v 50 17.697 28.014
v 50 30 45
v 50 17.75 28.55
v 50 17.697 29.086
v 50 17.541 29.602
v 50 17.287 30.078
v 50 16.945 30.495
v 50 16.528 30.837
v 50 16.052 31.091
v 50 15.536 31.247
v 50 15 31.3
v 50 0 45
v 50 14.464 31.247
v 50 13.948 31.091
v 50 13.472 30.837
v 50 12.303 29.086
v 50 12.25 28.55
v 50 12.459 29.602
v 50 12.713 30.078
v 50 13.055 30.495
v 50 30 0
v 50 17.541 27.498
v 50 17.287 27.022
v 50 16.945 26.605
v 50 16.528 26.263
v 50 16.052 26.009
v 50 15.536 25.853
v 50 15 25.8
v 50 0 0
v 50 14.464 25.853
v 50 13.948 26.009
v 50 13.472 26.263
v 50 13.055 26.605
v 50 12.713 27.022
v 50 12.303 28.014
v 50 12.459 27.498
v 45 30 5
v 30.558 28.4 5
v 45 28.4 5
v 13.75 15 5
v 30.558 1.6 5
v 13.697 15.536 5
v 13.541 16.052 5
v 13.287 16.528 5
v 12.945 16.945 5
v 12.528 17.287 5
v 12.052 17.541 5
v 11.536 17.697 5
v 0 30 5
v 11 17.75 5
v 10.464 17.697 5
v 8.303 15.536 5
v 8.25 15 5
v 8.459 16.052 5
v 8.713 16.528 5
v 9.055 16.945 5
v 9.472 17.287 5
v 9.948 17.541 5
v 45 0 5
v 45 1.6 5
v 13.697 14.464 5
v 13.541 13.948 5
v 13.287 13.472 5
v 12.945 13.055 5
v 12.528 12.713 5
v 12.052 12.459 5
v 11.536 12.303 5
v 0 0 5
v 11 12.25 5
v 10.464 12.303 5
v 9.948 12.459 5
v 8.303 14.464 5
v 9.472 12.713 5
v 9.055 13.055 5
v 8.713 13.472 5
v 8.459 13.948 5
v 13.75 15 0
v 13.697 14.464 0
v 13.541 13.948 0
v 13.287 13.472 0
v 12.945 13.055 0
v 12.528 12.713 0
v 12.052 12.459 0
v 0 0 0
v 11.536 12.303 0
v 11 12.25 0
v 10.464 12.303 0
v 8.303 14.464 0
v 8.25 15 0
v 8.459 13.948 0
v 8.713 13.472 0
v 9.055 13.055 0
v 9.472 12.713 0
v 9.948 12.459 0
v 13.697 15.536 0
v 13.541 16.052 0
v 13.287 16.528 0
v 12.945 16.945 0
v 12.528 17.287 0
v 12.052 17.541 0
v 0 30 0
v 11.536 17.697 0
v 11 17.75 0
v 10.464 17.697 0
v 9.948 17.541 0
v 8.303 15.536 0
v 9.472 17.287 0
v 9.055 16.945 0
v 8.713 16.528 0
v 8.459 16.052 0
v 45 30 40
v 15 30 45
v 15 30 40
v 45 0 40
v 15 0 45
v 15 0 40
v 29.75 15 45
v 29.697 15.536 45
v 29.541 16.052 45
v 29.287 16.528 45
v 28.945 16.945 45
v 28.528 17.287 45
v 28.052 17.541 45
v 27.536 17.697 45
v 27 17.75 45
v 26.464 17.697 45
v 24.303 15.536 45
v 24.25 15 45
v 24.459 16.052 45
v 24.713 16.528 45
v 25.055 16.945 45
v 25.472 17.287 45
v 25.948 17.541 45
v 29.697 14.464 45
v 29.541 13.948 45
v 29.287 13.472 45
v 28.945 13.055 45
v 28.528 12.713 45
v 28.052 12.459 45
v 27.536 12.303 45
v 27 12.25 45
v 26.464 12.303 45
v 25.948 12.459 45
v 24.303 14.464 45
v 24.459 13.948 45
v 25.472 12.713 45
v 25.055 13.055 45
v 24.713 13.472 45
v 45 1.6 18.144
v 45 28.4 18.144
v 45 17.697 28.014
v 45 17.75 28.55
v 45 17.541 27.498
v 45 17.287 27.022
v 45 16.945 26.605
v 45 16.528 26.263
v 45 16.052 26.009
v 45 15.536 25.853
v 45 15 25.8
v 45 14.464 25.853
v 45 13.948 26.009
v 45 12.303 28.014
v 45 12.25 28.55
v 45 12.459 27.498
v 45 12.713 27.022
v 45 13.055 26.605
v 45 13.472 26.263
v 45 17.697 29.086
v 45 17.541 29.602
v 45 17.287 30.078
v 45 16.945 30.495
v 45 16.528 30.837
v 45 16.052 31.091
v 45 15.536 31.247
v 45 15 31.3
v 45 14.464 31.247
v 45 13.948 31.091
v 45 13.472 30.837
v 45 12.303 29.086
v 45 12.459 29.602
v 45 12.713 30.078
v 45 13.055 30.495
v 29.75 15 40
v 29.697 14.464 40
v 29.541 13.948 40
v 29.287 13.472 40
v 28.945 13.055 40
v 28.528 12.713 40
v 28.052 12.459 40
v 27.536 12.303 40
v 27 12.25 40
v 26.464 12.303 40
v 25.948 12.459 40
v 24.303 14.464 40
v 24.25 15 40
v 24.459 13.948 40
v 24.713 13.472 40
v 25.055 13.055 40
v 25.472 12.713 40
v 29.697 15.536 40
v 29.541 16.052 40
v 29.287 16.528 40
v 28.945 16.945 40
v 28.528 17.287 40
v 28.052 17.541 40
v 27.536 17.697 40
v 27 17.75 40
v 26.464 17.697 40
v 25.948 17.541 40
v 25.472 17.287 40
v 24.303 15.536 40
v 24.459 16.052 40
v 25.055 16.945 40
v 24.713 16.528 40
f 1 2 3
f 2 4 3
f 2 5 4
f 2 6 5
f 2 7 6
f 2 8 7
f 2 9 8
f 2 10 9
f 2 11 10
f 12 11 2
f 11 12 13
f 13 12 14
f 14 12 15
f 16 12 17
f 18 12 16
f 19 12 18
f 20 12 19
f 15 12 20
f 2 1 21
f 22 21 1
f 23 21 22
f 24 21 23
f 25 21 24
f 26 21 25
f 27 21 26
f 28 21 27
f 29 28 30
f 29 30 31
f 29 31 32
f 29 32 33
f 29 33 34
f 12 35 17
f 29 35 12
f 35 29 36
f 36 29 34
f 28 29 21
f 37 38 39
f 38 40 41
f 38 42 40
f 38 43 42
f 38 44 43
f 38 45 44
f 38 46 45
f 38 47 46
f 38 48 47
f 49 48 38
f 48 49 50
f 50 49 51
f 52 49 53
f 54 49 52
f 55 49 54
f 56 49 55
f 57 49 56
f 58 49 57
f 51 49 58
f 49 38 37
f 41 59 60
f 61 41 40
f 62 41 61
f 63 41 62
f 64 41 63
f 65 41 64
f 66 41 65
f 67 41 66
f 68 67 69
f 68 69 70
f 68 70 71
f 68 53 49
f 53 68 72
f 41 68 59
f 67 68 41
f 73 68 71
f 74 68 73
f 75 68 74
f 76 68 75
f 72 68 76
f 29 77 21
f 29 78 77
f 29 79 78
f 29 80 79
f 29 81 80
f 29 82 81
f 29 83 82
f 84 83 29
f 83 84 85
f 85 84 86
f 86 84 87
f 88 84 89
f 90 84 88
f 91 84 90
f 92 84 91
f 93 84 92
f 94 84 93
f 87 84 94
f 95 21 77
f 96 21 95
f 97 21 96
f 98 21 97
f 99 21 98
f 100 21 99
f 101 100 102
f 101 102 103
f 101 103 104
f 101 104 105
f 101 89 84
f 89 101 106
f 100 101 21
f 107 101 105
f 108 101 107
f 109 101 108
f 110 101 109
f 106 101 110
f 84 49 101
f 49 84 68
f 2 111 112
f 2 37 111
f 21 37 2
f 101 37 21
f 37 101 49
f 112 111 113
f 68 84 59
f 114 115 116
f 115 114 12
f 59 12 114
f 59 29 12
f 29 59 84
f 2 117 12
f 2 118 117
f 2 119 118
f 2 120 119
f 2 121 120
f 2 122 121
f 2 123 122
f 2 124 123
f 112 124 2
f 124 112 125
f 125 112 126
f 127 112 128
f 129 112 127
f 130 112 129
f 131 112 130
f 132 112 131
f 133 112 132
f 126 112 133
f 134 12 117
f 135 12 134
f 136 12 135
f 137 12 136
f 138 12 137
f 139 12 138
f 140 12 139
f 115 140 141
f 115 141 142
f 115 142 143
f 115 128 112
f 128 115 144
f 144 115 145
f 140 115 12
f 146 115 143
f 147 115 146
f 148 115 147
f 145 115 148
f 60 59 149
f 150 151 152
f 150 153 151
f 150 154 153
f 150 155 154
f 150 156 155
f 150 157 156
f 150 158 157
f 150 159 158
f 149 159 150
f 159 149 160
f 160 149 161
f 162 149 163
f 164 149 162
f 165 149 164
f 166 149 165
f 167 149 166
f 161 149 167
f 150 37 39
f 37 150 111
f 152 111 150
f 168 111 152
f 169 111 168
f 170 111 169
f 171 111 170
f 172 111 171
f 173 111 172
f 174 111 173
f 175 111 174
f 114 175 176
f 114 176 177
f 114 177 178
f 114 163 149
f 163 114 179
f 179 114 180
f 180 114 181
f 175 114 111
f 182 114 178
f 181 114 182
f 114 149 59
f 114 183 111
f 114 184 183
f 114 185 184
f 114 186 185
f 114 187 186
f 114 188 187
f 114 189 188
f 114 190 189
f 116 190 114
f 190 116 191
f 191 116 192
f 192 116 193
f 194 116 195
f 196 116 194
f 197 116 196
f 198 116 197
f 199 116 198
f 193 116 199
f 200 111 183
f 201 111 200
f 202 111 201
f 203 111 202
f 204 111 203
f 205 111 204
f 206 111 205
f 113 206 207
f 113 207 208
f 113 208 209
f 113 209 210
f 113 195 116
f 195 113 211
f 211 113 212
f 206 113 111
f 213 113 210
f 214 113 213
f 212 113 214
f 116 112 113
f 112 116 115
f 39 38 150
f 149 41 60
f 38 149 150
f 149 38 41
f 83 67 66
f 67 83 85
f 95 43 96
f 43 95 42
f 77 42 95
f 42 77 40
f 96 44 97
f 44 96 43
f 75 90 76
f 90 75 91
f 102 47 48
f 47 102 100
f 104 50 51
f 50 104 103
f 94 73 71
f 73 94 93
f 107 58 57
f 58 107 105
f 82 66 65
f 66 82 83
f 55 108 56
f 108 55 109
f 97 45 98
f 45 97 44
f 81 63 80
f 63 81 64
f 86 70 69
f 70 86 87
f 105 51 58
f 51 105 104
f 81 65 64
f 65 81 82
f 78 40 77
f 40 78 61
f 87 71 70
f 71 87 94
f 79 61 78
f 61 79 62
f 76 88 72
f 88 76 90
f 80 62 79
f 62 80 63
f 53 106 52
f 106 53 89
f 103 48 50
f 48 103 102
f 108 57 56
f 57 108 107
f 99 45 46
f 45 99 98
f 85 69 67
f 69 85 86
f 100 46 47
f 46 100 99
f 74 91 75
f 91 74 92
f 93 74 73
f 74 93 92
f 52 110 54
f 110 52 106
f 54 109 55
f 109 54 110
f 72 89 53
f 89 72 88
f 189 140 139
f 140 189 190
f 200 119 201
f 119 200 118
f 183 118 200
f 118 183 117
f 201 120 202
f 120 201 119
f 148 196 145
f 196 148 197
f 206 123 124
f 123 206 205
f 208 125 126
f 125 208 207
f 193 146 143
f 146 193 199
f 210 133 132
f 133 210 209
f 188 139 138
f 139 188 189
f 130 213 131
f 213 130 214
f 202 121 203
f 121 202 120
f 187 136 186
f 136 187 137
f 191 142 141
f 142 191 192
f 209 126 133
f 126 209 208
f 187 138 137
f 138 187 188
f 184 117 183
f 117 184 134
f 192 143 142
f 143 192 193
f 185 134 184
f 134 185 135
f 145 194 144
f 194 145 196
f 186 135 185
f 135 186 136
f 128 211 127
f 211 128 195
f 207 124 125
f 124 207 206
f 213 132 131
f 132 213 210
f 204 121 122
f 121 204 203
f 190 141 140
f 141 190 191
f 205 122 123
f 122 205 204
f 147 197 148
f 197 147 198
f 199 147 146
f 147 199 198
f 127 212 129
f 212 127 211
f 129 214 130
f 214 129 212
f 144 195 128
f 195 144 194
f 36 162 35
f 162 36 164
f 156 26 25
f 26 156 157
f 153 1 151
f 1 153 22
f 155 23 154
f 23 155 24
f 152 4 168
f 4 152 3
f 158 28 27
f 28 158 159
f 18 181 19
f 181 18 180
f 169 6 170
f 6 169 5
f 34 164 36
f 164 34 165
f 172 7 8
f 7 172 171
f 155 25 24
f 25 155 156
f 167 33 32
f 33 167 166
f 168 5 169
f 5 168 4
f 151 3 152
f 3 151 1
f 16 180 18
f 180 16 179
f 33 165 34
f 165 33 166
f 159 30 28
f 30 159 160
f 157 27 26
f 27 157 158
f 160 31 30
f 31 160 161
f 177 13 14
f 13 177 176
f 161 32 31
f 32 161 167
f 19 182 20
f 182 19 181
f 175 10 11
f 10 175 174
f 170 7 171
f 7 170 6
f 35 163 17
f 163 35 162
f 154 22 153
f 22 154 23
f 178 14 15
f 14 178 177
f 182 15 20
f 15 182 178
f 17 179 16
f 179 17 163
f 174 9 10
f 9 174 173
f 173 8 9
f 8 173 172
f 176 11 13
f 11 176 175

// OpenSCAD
$fn = 32;

// ----------------------------------------------------------------------
// Z-bracket: 50 x 30 x 45 mm
// ----------------------------------------------------------------------

// --- parameters (mm) ---
foot_len = 50;            // lower foot length, X
top_len = 30;             // upper foot length, X
depth = 30;               // bracket width, Y
step_h = 45;              // overall rise, Z
plate_t = 5;              // plate thickness
hole_d = 5.5;             // clearance for M5
rib_len = 16.2;           // gusset leg
rib_sink = 1.6;           // gusset overlap into the plates

module hole_z(px, py, z0) {
  translate([px, py, z0 - 2.5]) cylinder(h = plate_t + 5, d = hole_d);
}
module hole_x(py, pz) {
  translate([-2.5, py, pz]) rotate([0, 90, 0]) cylinder(h = plate_t + 5, d = hole_d);
}
module gusset(x0) {
  translate([x0, depth - rib_sink, 0])
    rotate([90, 0, 0])
      linear_extrude(height = depth - 2 * rib_sink)
        polygon(points = [[rib_sink, plate_t - rib_sink],
                          [rib_sink, plate_t - rib_sink + rib_len],
                          [-rib_len, plate_t - rib_sink]]);
}

difference() {
  union() {
    cube([foot_len, depth, plate_t]);
    /* web, overlapping the lower foot */
    translate([foot_len - plate_t, 0, 0]) cube([plate_t, depth, step_h]);
    /* upper foot, sunk into the web */
    translate([foot_len - plate_t - top_len, 0, step_h - plate_t]) cube([top_len + plate_t, depth, plate_t]);
    gusset(foot_len - plate_t);
  }
  hole_z(11, 15, 0);
  translate([foot_len - plate_t - 18, 0, 0]) hole_z(0, 15, step_h - plate_t);
  translate([foot_len - plate_t, 0, 0]) hole_x(15, 28.55);
}
